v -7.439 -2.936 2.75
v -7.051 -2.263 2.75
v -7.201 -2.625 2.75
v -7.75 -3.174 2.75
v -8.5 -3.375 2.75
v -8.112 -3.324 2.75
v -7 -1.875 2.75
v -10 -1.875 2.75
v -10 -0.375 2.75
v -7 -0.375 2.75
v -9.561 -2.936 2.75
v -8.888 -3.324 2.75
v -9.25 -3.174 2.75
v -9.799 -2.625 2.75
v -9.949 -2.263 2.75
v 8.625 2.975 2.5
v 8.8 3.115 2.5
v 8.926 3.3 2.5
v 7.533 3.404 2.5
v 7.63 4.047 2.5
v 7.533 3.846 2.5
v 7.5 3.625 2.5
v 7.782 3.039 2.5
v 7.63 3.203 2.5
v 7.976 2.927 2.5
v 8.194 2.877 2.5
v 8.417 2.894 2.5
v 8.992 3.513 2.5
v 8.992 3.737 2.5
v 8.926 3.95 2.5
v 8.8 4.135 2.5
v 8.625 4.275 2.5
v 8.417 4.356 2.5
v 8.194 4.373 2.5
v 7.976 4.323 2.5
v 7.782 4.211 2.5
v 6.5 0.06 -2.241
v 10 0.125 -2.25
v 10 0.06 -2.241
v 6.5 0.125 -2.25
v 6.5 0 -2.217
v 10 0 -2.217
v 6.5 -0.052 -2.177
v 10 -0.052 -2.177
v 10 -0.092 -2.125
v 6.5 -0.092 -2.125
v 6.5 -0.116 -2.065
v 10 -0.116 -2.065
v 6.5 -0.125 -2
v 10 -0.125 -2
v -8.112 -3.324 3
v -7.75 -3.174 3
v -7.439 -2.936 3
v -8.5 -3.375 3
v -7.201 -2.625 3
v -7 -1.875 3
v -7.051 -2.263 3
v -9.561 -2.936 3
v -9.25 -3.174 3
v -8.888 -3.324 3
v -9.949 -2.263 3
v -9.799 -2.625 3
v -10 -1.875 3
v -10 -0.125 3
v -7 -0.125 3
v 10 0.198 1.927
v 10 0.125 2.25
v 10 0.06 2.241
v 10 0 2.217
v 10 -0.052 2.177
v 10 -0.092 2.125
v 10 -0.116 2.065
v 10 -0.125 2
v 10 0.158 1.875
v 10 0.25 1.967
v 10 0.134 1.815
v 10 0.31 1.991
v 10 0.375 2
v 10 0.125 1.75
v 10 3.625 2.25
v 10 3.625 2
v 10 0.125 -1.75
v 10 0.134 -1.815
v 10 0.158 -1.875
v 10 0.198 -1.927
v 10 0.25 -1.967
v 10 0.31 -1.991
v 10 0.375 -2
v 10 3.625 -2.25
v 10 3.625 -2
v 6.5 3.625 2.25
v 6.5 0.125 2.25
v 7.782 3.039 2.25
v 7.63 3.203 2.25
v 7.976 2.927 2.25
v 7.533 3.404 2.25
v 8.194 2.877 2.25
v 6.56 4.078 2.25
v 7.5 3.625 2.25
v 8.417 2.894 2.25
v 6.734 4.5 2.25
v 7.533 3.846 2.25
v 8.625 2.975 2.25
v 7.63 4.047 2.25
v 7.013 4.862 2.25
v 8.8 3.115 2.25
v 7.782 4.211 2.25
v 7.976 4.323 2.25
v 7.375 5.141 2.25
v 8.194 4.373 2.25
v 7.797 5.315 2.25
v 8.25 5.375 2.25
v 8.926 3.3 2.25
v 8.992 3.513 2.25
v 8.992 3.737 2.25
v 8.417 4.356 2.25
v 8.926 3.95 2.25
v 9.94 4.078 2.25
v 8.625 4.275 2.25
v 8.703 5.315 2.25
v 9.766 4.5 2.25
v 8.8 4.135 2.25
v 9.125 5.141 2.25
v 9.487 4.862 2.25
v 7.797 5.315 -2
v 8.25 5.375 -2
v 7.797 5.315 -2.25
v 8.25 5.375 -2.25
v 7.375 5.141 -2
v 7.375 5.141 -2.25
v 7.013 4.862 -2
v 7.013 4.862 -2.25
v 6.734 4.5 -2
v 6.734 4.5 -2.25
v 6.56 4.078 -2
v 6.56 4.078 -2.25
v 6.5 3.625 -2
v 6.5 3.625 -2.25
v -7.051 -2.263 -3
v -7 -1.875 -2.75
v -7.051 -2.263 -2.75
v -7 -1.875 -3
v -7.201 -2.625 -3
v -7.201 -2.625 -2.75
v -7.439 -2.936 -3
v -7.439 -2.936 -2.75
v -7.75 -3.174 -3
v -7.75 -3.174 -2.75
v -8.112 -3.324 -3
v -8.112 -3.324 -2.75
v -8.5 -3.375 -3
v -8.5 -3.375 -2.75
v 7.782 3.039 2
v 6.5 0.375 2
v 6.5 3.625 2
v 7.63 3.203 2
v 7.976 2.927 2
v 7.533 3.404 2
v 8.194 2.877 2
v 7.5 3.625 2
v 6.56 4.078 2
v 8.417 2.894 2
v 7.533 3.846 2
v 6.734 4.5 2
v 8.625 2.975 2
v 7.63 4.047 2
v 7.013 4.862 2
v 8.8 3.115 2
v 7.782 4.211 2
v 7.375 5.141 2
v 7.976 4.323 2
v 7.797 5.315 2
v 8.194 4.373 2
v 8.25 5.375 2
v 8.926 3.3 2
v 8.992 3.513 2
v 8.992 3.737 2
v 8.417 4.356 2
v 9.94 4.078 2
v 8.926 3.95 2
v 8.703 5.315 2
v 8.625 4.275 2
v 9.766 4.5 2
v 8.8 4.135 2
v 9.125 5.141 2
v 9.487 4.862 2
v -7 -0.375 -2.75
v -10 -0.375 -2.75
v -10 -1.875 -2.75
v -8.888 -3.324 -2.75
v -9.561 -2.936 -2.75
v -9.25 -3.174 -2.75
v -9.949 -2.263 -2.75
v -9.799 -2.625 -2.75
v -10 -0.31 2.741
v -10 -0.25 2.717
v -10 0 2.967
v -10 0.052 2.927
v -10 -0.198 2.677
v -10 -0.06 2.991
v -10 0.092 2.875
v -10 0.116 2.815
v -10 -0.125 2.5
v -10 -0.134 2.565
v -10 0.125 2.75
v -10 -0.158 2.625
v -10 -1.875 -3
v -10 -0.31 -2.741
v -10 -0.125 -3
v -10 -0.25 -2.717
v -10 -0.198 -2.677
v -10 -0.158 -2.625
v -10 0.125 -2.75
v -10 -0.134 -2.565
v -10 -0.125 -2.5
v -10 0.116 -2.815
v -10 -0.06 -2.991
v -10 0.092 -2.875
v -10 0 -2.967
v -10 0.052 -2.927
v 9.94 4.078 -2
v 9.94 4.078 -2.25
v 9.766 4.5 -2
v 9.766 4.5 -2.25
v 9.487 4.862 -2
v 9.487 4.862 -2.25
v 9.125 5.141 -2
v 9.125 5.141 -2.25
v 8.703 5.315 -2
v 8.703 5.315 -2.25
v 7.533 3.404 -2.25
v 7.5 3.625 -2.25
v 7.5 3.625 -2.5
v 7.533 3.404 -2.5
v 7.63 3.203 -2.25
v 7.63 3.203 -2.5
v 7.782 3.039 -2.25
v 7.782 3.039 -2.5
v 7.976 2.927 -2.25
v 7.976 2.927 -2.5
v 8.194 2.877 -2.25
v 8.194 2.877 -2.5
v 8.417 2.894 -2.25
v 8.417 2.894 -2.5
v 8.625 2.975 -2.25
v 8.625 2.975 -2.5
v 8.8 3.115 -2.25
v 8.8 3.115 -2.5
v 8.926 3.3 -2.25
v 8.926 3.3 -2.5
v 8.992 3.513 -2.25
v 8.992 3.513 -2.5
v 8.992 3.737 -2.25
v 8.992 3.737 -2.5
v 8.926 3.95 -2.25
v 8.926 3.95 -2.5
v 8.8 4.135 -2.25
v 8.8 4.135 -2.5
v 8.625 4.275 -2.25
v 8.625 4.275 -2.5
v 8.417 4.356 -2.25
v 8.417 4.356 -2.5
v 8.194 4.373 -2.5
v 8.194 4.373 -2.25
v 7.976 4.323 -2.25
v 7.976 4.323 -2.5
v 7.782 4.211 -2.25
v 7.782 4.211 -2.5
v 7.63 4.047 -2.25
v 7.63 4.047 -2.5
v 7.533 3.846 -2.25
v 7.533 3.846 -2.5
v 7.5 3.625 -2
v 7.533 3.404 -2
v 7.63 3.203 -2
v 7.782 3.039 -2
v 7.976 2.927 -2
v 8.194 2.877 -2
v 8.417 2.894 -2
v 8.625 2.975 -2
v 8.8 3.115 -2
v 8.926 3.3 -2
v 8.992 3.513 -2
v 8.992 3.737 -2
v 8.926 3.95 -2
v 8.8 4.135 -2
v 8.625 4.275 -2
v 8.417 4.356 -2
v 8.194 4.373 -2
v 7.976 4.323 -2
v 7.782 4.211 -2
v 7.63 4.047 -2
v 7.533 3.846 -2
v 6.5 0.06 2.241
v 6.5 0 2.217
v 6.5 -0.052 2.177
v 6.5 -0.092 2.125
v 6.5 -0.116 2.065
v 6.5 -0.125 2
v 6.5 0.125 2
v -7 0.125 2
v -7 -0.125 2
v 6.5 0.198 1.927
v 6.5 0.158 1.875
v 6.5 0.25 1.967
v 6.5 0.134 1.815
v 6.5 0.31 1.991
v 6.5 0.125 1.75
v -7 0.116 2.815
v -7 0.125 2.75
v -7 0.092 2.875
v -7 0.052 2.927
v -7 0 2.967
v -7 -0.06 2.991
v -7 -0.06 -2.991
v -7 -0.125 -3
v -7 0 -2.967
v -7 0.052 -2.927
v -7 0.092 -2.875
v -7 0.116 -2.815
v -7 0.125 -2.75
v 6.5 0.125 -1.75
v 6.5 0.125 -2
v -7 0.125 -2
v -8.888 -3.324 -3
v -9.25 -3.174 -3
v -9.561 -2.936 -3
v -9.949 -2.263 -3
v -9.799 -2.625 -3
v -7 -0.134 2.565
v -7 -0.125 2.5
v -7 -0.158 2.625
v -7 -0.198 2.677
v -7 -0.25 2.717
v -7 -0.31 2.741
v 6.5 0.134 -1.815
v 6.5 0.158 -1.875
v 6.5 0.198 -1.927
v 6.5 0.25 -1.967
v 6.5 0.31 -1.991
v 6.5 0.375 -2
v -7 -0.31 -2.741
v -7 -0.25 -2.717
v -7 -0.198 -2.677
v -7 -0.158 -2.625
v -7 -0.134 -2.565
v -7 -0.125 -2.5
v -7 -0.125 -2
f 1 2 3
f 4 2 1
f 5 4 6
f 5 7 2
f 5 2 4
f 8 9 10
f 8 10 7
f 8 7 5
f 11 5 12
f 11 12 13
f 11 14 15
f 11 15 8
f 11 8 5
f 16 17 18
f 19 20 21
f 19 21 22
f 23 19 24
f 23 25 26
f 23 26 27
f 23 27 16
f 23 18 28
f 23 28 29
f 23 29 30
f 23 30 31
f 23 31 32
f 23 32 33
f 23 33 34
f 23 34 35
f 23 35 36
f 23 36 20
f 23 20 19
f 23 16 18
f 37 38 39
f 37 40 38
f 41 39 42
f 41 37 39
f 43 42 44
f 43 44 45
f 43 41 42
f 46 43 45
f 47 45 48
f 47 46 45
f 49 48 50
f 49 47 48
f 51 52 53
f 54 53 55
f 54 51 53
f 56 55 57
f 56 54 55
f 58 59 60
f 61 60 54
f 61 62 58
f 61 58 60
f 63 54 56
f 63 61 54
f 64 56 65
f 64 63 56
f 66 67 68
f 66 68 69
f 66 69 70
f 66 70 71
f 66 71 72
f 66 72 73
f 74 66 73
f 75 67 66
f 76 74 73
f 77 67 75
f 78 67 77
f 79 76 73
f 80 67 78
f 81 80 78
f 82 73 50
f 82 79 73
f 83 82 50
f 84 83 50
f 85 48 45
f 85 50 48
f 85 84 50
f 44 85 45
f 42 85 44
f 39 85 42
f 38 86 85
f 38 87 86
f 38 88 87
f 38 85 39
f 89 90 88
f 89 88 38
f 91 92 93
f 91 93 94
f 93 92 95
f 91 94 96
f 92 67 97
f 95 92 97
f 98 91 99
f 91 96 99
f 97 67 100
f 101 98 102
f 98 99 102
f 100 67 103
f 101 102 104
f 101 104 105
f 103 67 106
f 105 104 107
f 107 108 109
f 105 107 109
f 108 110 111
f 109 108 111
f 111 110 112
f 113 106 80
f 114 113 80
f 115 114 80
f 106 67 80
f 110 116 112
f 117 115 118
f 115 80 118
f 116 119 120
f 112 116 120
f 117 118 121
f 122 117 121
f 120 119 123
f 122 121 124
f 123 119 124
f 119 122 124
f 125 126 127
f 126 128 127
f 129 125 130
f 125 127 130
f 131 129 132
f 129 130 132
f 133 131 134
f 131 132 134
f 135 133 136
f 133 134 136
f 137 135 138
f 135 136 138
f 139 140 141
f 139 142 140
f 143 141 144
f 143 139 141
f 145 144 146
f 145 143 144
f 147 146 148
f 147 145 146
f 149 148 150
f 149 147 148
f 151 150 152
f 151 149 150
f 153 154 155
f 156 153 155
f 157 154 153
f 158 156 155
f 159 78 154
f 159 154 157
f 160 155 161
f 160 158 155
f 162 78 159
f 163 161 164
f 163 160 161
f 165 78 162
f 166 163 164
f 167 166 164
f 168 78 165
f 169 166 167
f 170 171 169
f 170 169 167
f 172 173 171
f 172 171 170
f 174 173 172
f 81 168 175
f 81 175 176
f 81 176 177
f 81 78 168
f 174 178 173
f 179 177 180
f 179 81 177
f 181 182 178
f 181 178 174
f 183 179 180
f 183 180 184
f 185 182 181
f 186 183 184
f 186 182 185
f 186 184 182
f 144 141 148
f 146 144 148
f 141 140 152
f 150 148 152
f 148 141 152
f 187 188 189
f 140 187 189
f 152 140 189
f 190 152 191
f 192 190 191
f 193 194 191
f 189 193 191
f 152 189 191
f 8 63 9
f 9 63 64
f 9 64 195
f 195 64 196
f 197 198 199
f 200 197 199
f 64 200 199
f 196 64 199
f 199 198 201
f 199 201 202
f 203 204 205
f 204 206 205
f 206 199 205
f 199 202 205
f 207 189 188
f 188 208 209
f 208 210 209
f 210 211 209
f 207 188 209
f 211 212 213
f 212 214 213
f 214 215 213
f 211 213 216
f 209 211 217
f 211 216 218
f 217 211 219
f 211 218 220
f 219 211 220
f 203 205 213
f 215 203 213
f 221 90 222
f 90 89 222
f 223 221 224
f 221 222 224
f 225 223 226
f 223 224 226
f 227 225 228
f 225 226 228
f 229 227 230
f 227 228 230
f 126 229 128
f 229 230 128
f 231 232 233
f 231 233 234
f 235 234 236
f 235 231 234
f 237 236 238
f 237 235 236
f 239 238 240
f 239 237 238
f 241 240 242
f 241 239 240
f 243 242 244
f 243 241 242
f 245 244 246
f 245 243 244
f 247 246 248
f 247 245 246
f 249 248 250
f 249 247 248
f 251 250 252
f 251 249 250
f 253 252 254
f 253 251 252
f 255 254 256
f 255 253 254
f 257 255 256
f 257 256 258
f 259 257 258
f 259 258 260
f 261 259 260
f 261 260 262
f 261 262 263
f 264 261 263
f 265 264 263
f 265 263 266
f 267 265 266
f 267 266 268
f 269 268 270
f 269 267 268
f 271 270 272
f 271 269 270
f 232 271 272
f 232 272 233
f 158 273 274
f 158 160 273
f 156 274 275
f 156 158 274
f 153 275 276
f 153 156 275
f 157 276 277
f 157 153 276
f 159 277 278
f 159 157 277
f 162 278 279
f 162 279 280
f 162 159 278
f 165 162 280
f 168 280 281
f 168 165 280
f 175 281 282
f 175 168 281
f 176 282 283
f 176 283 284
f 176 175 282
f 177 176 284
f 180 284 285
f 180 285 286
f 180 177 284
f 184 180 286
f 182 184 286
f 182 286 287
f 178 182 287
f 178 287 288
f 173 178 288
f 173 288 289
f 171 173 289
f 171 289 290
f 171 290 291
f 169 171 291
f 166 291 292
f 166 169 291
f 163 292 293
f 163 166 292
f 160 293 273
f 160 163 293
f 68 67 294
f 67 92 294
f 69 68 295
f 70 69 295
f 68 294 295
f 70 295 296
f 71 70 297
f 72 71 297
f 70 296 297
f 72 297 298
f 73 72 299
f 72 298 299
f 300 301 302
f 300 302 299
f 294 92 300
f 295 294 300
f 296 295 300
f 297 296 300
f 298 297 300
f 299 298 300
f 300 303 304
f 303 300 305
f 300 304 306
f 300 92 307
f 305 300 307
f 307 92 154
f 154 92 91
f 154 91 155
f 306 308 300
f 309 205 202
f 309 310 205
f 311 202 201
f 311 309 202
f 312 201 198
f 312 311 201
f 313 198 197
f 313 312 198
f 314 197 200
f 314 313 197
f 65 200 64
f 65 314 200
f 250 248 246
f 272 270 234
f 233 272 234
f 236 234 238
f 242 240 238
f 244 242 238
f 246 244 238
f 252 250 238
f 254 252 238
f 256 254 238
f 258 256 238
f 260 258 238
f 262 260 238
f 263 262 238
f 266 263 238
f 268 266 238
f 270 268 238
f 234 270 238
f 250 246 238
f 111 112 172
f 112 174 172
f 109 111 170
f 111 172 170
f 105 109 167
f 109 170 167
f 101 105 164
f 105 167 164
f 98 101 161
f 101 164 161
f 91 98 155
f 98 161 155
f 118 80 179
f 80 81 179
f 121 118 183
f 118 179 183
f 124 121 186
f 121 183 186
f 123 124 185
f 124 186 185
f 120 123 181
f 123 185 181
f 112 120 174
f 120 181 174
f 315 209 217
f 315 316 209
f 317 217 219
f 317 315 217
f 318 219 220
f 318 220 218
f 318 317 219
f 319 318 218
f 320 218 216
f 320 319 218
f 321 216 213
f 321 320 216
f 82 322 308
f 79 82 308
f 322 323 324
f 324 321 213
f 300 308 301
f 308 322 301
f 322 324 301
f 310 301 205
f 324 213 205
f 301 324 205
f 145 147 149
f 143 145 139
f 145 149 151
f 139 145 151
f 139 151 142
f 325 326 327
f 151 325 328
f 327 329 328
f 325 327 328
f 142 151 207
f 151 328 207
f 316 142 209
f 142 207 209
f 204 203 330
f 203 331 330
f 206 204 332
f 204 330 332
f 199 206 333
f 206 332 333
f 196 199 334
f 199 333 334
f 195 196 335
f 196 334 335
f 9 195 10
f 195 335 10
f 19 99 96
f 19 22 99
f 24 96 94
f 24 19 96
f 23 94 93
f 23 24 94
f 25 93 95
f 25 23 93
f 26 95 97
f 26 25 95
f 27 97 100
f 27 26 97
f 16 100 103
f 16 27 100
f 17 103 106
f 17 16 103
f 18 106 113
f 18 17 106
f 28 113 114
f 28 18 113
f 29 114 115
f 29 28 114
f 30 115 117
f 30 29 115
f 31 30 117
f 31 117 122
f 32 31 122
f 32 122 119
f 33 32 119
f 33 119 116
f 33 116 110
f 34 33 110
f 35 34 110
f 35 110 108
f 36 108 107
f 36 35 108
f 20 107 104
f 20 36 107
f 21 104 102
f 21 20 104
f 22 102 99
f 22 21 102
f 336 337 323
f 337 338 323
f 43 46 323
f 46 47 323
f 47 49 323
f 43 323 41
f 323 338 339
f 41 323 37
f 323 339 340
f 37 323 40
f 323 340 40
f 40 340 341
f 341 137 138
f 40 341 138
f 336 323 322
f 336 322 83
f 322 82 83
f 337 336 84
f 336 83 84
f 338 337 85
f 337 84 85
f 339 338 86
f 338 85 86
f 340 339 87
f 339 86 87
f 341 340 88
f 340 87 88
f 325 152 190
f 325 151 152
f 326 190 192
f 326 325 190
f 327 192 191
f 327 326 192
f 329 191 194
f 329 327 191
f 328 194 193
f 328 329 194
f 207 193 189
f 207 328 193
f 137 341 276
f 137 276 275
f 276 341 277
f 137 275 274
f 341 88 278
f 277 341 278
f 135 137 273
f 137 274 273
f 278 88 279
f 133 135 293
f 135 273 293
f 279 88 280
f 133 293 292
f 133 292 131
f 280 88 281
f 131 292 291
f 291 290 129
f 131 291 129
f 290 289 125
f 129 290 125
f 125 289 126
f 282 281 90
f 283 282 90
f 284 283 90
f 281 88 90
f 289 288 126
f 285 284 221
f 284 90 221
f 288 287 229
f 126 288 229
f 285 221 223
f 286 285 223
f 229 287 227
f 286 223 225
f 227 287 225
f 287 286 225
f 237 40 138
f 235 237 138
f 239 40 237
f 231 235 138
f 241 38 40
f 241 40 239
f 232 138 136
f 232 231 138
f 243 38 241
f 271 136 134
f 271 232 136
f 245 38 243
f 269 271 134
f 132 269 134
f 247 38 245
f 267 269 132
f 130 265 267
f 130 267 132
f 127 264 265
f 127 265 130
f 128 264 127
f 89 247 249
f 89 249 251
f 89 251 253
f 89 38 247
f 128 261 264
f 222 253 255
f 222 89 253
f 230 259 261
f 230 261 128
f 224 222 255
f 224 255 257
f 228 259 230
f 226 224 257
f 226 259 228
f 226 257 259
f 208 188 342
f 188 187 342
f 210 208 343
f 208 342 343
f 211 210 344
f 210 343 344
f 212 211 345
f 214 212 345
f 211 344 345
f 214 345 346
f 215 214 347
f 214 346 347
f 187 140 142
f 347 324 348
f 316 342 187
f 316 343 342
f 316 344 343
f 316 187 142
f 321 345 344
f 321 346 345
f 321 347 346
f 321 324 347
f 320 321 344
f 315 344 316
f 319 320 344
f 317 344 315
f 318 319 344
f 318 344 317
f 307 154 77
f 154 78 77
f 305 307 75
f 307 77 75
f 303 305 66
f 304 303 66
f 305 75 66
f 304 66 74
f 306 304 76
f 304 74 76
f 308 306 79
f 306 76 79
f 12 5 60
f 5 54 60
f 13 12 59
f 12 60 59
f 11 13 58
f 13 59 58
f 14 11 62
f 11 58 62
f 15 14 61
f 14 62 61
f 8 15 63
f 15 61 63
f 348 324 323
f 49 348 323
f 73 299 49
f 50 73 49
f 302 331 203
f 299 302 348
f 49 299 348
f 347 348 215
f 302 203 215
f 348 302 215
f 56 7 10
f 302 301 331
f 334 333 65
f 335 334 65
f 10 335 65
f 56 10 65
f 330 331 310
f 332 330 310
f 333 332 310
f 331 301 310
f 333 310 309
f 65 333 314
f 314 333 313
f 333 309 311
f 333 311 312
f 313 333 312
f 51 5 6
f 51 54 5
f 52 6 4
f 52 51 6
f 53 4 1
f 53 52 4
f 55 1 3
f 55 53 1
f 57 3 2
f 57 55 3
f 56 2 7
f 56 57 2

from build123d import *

# Parameters (mm, degrees)
SKETCH1_W           = 20
SKETCH1_H           = 0.25
BOSS_EXTRUDE1_DEPTH = 2
SKETCH2_W           = 0.25
SKETCH2_H           = 5.5
BOSS_EXTRUDE2_DEPTH = 3.5
FILLET1_R           = 0.25
FILLET2_R           = 1.75
BOSS_EXTRUDE3_START = -2.25
SKETCH3_R           = 0.75
BOSS_EXTRUDE3_DEPTH = 2.5
BOSS_EXTRUDE5_DEPTH = 3
FILLET3_R           = 1.5
FILLET4_R           = 0.25


with BuildPart() as part:
    # Sketch1 → Boss-Extrude1 (new, symmetric)
    with BuildSketch(Plane.XY):
        Rectangle(SKETCH1_W, SKETCH1_H)
    extrude(amount=BOSS_EXTRUDE1_DEPTH, both=True)

    # Sketch2 → Boss-Extrude2 (add)
    with BuildSketch(Plane(origin=(10, 0, 0), x_dir=(0, 0, -1), z_dir=(1, 0, 0))):
        with Locations((-2.125, 2.625)):
            Rectangle(SKETCH2_W, SKETCH2_H)
        with Locations((2.125, 2.625)):
            Rectangle(SKETCH2_W, SKETCH2_H)
    extrude(amount=-BOSS_EXTRUDE2_DEPTH)

    # Fillet1
    fillet1_edges = [part.edges().sort_by_distance(p)[0] for p in [
        (8.25, -0.125, -2.25),
        (8.25, -0.125, 2.25),
        (8.25, 0.125, -2),
        (8.25, 0.125, 2),
    ]]
    fillet(fillet1_edges, radius=FILLET1_R)

    # Fillet2
    fillet2_edges = [part.edges().sort_by_distance(p)[0] for p in [
        (10, 5.375, -2.125),
        (6.5, 5.375, -2.125),
        (6.5, 5.375, 2.125),
        (10, 5.375, 2.125),
    ]]
    fillet(fillet2_edges, radius=FILLET2_R - 0.0001)  # a hair under: the kernel refuses the full size

    # Sketch3 → Boss-Extrude3 (add, symmetric)
    with BuildSketch(Plane.XY.offset(2.25).offset(BOSS_EXTRUDE3_START)):
        with Locations(Location((8.25, 3.625, 0), (0, 0, 180))):
            Circle(SKETCH3_R)
    extrude(amount=BOSS_EXTRUDE3_DEPTH, both=True)

    # Sketch5 → Boss-Extrude5 (add)
    with BuildSketch(Plane.ZY.offset(10)):
        Polygon((-2, -0.125), (-2.75, -0.125), (-2.75, -3.375), (-3, -3.375), (-3, 0.125), (-2, 0.125), align=None)
        Polygon((3, 0.125), (2, 0.125), (2, -0.125), (2.75, -0.125), (2.75, -3.375), (3, -3.375), align=None)
    extrude(amount=-BOSS_EXTRUDE5_DEPTH)

    # Fillet3
    fillet3_edges = [part.edges().sort_by_distance(p)[0] for p in [
        (-10, -3.375, 2.875),
        (-7, -3.375, 2.875),
        (-7, -3.375, -2.875),
        (-10, -3.375, -2.875),
    ]]
    fillet(fillet3_edges, radius=FILLET3_R - 0.0001)  # a hair under: the kernel refuses the full size

    # Fillet4
    fillet4_edges = [part.edges().sort_by_distance(p)[0] for p in [
        (-8.5, -0.125, -2.75),
        (-8.5, 0.125, -3),
        (-8.5, 0.125, 3),
        (-8.5, -0.125, 2.75),
    ]]
    fillet(fillet4_edges, radius=FILLET4_R)


solid = part.part
